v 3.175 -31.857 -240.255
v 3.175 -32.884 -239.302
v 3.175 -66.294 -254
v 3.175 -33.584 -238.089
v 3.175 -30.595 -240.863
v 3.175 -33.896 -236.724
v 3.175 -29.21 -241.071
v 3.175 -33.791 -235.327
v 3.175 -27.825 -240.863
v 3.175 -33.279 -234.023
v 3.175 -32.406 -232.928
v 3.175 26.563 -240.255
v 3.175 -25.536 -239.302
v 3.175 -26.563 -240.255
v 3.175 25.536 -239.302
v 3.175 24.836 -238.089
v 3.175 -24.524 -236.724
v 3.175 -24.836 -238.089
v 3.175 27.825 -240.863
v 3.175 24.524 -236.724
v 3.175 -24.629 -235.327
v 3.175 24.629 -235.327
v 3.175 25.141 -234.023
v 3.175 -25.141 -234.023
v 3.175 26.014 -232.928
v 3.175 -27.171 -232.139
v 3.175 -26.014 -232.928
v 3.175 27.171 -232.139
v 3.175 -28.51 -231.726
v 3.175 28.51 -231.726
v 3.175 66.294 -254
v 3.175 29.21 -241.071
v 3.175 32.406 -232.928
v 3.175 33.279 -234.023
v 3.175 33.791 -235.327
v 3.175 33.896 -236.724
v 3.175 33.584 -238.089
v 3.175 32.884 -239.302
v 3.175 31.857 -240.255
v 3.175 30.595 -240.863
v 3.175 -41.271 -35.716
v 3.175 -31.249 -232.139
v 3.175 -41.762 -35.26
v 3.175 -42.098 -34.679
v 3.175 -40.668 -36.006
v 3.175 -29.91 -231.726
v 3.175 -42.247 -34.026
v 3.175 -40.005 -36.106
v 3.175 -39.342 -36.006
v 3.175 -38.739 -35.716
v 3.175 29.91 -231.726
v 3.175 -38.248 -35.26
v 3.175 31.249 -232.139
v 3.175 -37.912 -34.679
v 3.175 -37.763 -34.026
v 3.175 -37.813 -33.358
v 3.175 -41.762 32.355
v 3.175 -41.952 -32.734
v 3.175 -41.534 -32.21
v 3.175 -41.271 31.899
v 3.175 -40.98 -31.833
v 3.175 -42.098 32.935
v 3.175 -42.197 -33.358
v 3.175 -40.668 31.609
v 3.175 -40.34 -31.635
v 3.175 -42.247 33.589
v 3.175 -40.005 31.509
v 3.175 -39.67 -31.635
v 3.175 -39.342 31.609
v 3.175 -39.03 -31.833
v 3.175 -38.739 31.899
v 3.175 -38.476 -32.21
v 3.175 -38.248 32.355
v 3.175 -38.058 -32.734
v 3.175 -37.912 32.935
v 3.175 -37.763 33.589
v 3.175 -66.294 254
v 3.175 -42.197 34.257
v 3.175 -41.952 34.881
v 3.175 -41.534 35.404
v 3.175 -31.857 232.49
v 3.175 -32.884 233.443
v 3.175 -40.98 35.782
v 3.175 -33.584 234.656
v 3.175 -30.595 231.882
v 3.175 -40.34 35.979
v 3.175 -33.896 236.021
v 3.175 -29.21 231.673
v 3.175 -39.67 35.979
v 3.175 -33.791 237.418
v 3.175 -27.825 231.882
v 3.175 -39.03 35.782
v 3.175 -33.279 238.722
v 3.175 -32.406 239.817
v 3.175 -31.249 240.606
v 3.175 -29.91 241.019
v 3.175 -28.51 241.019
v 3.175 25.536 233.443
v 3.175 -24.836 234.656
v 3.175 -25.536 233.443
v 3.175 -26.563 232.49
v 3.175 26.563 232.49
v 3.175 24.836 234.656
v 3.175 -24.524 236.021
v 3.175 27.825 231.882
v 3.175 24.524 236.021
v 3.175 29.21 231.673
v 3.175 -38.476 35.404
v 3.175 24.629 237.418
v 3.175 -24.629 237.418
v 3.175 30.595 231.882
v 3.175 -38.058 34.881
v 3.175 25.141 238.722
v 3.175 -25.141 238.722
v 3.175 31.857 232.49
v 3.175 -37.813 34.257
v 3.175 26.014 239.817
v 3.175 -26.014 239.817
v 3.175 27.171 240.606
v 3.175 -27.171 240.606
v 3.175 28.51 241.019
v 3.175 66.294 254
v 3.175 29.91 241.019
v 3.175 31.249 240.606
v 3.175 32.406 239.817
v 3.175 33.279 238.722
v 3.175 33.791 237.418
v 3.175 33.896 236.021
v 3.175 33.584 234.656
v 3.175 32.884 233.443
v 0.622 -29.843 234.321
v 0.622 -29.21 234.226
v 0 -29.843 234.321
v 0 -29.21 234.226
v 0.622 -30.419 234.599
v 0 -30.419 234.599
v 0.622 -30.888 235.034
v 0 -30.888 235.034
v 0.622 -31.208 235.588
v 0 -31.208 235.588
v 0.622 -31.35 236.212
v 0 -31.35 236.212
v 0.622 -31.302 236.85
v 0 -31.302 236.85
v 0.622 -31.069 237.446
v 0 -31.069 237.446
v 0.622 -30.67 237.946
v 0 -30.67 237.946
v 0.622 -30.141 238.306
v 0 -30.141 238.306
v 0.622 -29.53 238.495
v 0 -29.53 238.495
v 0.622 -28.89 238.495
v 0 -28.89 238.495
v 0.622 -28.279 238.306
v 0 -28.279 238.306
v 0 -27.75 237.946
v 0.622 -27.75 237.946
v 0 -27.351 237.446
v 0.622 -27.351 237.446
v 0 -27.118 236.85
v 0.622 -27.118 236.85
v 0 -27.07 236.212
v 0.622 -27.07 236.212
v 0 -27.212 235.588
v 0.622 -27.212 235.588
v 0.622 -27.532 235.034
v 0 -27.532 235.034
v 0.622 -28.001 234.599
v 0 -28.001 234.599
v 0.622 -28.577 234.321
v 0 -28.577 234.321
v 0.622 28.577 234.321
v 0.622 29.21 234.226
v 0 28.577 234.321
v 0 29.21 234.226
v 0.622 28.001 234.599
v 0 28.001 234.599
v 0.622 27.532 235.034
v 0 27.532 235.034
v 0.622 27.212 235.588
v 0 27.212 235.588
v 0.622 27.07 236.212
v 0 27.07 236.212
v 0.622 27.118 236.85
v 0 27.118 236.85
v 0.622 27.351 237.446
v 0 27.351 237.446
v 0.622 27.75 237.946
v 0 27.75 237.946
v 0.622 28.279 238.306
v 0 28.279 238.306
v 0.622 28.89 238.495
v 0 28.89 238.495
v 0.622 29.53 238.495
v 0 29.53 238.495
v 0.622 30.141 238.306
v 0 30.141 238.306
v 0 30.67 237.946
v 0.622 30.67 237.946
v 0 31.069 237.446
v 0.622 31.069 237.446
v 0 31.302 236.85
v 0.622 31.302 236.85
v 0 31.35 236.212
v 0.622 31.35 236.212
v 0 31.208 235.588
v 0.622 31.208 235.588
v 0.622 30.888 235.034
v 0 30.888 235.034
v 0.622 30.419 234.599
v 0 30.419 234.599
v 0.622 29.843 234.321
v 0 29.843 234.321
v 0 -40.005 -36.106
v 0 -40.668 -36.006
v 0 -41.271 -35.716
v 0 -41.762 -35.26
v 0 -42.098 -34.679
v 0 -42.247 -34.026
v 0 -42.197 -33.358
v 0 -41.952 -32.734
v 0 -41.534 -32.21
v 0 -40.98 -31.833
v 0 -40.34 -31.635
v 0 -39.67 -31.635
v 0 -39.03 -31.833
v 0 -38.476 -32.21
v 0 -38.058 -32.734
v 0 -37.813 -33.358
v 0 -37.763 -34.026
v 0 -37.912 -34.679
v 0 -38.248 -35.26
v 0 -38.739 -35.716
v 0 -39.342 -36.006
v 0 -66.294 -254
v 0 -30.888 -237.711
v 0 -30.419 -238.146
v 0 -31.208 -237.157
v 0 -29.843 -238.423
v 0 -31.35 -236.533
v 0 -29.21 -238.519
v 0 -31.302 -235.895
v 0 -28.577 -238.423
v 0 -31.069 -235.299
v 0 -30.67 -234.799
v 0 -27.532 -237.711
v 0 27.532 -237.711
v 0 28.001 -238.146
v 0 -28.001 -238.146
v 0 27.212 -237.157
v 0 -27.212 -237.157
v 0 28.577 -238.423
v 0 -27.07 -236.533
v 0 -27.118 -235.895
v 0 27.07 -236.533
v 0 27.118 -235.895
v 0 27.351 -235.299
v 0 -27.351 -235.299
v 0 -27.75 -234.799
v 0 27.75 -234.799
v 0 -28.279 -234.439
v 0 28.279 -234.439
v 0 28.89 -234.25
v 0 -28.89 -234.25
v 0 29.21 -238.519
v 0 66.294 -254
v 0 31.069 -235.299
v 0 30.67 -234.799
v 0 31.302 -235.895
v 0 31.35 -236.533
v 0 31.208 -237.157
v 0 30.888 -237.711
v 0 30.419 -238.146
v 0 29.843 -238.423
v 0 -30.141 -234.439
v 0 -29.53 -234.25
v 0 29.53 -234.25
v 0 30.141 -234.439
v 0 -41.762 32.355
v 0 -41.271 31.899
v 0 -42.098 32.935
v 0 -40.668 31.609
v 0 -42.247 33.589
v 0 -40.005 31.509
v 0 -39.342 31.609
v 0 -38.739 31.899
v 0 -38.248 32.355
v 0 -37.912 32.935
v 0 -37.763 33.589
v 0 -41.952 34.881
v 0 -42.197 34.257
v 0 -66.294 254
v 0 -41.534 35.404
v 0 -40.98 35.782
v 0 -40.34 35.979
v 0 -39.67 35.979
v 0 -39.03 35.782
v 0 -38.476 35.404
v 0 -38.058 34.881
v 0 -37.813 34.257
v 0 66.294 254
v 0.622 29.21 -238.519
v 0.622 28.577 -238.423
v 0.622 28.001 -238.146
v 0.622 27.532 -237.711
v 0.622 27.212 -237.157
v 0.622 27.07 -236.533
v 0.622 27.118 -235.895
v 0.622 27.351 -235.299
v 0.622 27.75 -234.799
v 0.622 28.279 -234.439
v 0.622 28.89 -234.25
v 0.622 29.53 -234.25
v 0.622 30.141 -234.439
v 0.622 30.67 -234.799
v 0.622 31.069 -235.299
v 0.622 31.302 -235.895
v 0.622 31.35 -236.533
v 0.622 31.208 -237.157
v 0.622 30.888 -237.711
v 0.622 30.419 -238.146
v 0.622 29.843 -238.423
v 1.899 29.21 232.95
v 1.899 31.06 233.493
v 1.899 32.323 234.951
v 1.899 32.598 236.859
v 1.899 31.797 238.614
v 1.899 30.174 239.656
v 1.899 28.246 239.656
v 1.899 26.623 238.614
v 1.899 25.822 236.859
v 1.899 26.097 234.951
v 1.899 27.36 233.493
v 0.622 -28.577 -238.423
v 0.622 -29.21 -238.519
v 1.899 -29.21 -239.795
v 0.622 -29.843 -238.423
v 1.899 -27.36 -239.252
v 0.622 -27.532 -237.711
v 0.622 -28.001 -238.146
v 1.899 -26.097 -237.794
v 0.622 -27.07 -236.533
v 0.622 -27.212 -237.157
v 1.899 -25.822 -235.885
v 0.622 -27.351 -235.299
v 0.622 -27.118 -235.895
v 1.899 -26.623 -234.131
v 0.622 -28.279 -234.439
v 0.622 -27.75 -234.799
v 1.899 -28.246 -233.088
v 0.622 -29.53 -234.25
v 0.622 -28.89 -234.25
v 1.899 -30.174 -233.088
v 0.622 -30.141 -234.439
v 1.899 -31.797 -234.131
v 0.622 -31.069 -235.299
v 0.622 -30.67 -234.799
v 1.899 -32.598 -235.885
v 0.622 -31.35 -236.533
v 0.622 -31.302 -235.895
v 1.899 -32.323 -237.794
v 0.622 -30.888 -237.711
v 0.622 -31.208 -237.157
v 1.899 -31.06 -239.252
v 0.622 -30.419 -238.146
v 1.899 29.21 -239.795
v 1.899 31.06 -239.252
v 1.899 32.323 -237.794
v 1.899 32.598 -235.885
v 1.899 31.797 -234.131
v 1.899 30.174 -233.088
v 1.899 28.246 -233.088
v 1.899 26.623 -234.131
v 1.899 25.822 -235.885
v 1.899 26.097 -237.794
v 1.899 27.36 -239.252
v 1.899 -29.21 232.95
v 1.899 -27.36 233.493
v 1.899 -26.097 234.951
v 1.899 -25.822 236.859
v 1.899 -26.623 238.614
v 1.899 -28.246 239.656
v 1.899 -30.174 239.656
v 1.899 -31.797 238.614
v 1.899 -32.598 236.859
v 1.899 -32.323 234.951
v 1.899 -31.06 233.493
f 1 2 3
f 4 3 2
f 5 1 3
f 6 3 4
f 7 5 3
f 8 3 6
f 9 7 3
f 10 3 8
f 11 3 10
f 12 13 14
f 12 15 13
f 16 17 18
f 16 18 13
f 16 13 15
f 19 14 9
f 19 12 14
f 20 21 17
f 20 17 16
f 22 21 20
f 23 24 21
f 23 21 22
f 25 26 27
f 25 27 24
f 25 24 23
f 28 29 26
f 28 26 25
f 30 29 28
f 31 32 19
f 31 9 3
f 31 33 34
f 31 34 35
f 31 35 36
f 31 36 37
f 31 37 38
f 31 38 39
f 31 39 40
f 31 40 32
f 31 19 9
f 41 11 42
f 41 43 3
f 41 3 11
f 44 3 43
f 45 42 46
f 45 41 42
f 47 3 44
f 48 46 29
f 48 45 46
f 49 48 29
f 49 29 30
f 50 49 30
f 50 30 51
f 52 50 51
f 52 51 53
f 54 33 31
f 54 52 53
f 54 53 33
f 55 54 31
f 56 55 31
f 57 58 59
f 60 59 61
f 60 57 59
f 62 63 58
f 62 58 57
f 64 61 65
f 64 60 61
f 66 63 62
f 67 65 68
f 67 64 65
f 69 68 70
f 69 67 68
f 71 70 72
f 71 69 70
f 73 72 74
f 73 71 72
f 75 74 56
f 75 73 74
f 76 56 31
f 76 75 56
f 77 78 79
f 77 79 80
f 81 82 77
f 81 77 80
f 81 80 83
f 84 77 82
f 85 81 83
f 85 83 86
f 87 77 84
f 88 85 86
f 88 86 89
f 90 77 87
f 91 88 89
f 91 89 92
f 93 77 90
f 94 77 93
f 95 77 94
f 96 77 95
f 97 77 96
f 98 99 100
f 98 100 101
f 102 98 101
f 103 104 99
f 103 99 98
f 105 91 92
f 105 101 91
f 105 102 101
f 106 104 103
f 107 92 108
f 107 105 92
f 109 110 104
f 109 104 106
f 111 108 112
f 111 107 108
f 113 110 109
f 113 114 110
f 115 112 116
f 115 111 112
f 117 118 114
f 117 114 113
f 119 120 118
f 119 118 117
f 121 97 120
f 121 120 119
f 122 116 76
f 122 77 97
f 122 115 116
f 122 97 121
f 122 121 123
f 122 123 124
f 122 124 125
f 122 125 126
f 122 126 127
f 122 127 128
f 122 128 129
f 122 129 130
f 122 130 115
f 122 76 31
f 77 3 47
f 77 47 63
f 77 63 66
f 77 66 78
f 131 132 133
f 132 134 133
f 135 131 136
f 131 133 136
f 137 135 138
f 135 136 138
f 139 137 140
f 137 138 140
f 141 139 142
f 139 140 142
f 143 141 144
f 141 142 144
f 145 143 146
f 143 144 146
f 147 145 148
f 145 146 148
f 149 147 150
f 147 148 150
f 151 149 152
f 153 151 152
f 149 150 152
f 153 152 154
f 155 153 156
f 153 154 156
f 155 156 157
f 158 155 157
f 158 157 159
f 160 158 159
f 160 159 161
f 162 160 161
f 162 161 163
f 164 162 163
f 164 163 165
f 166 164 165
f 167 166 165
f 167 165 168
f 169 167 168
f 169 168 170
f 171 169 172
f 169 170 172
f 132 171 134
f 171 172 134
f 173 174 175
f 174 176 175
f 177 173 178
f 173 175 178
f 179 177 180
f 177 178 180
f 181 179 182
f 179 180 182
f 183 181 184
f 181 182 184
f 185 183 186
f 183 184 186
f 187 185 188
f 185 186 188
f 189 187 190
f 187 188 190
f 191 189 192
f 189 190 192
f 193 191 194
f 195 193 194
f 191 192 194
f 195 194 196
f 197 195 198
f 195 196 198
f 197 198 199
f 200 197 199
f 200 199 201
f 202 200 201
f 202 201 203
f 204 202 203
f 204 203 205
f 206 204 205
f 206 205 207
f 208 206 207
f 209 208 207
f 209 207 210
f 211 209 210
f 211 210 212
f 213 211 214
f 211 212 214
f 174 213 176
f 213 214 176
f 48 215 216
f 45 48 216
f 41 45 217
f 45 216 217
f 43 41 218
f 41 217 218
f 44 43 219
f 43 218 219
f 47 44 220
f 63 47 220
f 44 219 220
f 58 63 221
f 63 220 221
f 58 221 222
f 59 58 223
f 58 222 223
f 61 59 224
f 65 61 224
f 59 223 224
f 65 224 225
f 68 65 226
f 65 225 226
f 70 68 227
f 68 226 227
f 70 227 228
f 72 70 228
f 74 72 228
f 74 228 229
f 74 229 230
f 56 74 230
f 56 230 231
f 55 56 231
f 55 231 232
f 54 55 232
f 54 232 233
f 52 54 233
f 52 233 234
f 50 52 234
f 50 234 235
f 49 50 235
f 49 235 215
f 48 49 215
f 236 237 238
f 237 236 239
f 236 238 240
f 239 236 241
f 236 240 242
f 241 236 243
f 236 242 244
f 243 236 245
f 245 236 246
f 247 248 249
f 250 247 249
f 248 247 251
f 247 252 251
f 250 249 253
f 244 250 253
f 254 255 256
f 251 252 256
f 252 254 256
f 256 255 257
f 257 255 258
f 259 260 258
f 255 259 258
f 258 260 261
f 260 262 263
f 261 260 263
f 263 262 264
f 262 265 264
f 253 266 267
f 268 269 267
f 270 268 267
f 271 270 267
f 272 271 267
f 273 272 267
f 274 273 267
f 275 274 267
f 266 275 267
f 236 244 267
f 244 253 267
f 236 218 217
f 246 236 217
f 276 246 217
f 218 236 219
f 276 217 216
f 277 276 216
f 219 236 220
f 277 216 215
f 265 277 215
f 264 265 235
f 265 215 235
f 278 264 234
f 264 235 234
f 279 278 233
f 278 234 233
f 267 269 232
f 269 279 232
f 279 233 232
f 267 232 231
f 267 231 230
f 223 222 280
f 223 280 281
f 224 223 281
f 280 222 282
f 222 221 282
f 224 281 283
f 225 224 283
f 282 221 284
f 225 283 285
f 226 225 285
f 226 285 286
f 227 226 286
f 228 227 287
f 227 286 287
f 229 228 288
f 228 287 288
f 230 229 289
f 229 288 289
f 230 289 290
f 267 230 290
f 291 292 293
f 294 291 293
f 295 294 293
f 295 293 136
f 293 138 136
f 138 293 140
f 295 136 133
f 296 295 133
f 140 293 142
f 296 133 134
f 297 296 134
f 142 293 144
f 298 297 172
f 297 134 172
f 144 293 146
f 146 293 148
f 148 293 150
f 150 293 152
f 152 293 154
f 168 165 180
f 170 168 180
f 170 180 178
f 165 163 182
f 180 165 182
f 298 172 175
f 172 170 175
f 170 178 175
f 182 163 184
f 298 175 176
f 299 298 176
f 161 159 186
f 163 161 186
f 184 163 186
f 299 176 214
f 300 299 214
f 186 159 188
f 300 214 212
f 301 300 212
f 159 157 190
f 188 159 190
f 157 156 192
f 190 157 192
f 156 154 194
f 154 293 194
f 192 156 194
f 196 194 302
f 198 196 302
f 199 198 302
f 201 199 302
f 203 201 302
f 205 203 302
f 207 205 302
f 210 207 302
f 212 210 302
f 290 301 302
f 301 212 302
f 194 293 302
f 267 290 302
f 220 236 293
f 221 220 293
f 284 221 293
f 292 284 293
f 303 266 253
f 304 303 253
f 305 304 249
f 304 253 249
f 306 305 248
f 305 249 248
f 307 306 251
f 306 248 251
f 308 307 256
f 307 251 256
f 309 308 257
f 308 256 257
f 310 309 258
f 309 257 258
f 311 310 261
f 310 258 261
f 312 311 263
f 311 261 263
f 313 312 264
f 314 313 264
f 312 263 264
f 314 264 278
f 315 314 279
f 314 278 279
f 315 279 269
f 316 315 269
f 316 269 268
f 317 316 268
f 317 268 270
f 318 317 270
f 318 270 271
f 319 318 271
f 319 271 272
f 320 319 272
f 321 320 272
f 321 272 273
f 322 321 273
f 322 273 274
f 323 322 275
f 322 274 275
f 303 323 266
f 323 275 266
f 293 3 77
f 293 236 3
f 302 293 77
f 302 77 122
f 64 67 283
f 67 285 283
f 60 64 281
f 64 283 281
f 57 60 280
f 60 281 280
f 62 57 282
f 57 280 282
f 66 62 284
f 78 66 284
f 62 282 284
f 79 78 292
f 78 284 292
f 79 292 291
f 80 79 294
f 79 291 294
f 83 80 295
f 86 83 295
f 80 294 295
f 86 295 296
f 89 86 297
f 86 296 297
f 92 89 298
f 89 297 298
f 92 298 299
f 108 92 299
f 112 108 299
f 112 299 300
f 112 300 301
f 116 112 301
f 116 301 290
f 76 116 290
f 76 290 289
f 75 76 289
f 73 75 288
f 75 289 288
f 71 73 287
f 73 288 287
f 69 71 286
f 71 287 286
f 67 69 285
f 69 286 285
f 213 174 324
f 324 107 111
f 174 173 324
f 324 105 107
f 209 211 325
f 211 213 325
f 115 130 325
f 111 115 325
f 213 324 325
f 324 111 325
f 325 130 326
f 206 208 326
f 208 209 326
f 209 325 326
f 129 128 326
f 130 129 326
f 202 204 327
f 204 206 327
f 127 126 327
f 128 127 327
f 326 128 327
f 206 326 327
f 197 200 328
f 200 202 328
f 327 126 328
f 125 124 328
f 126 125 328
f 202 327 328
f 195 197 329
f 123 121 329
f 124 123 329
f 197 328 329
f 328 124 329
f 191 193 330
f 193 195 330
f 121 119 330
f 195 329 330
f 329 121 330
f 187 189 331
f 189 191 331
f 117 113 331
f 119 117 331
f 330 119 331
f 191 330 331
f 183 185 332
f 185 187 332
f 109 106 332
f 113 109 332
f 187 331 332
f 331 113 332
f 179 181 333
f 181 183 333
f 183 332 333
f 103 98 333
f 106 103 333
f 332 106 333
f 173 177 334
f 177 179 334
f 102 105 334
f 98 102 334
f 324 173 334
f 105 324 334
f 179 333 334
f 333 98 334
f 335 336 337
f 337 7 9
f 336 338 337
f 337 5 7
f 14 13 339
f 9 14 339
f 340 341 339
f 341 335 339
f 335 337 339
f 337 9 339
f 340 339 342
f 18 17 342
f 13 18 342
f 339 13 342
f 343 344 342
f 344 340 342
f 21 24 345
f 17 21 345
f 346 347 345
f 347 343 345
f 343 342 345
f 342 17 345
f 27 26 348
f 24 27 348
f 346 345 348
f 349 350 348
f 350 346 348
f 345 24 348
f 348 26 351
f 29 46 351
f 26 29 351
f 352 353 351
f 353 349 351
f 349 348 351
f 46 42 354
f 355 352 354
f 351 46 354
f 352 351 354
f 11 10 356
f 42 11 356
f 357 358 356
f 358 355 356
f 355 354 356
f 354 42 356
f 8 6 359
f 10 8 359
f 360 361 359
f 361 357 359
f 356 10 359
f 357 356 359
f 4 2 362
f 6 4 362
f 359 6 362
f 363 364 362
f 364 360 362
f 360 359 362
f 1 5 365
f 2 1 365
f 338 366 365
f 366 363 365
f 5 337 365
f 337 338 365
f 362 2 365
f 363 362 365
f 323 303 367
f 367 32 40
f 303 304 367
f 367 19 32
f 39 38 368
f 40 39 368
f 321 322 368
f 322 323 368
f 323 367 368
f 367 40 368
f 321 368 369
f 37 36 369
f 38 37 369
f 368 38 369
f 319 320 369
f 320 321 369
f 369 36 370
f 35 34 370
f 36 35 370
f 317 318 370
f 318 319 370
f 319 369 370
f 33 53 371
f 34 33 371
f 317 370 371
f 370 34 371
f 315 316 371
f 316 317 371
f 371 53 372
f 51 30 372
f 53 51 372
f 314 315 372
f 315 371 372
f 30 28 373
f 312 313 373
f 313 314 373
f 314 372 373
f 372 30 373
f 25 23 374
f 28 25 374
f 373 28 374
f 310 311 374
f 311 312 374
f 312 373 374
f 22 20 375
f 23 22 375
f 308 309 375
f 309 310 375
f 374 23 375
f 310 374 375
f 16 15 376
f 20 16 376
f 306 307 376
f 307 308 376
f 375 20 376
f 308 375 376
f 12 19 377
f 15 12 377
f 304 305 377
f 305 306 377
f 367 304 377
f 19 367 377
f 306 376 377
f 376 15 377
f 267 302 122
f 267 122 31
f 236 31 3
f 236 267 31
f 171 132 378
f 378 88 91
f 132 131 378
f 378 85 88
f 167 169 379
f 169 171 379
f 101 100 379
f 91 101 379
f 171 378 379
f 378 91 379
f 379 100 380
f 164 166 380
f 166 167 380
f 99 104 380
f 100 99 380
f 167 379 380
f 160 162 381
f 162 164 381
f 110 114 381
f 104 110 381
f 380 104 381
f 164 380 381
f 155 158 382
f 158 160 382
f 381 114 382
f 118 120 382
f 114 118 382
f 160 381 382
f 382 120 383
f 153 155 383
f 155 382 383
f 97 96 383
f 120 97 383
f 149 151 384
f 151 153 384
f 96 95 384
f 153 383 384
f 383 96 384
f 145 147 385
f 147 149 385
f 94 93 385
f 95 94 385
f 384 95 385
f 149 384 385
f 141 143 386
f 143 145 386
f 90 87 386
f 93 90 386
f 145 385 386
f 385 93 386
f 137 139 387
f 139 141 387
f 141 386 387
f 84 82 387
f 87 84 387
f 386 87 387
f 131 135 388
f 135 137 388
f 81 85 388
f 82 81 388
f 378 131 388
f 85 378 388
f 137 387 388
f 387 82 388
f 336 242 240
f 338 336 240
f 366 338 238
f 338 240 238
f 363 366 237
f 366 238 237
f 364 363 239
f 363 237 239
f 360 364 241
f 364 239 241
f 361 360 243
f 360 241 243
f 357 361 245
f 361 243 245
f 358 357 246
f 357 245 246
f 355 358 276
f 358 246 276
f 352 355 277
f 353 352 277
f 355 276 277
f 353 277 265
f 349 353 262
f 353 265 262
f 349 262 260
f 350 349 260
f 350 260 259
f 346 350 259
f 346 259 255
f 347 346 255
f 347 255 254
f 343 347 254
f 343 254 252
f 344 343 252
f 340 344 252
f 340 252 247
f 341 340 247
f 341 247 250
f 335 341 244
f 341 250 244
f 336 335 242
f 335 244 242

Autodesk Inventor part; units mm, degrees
ref_plane "YZ Plane" through (0, 0, 0) normal (1, 0, 0) x (0, 1, 0)
ref_plane "XZ Plane" through (0, 0, 0) normal (0, 1, 0) x (-1, 0, 0)
ref_plane "XY Plane" through (0, 0, 0) normal (0, 0, 1) x (1, 0, 0)
sketch "Sketch1" plane through (0, 0, 0) normal (1, 0, 0) x (0, 1, 0)
  line L0 (-66.294, 254) -> (66.294, 254)
  line L1 (66.294, 254) -> (66.294, -254)
  line L2 (66.294, -254) -> (-66.294, -254)
  line L3 (-66.294, -254) -> (-66.294, 254)
  line L4 (-66.294, 254) -> (66.294, -254) construction
  line L5 (66.294, 254) -> (-66.294, -254) construction
  point P0 (0, 0)
  dimension "d0" = 508
  dimension "d1" = 132.588
extrude "Extrusion1" add sketch "Sketch1" along normal blind 3.175
sketch "Sketch2" plane through (3.175, 0, 0) normal (1, 0, 0) x (0, 0, -1)
  line L0 (-67.5894, -66.294) -> (67.691, -66.294) construction
  line L1 (67.691, -66.294) -> (67.691, -22.098) construction
  line L2 (67.691, -22.098) -> (-67.5894, -22.098) construction
  line L3 (-67.5894, -22.098) -> (-67.5894, -66.294) construction
  line L4 (-67.5894, -66.294) -> (67.691, -22.098) construction
  line L5 (67.691, -66.294) -> (-67.5894, -22.098) construction
  line L6 (254, -66.294) -> (254, 66.294) construction
  line L7 (-254, -66.294) -> (254, -66.294) construction
  point P0 (0, 0)
  point P1 (0.0508, -44.196)
  point P2 (10.6003, -66.294)
  dimension "d4" = 135.2804
  dimension "d5" = 44.196
  dimension "d6" = 186.309
sketch "Sketch3" plane through (3.175, 0, 0) normal (1, 0, 0) x (0, 0, -1)
  line L0 (-33.7566, -40.005) -> (33.8582, -40.005) construction
  line L1 (-254, -66.294) -> (254, -66.294) construction
  line L2 (67.691, -66.294) -> (67.691, -22.098) construction
  line L3 (-67.5894, -22.098) -> (-67.5894, -66.294) construction
  point P0 (0, 0)
  dimension "d7" = 26.289
  dimension "d17" = 33.8328
  dimension "d18" = 33.8328
hole "Hole1" at (3.175, -40.005, 33.7566) at (3.175, -40.005, -33.8582) direction (-1, 0, 0) diameter 4.4958 end through all clearance for "Countersunk Flat Head Screw ISO 2009/7046" size "M4" standard "ISO"
sketch "brackets" plane through (3.175, 0, 0) normal (1, 0, 0) x (0, 0, -1)
  line L0 (254, -66.294) -> (254, 66.294) construction
  line L1 (249.428, 54.61) -> (230.378, 54.61) construction
  line L2 (230.378, 54.61) -> (230.378, -54.61) construction
  line L3 (230.378, -54.61) -> (249.428, -54.61) construction
  line L4 (249.428, -54.61) -> (249.428, 54.61) construction
  line L5 (254, 66.294) -> (-254, 66.294) construction
  line L6 (-254, 66.294) -> (-254, -66.294) construction
  line L7 (-249.428, 54.61) -> (-230.378, 54.61) construction
  line L8 (-230.378, 54.61) -> (-230.378, -54.61) construction
  line L9 (-230.378, -54.61) -> (-249.428, -54.61) construction
  line L10 (-249.428, -54.61) -> (-249.428, 54.61) construction
  point P0 (0, 0)
  point P1 (-236.3724, 29.21)
  point P2 (-236.3724, -29.21)
  point P3 (236.3724, 29.21)
  point P4 (236.3724, -29.21)
  dimension "d20" = 19.05
  dimension "d21" = 109.22
  dimension "d22" = 11.684
  dimension "d23" = 19.05
  dimension "d24" = 109.22
  dimension "d25" = 11.684
  dimension "d26" = 25.4
  dimension "d27" = 5.9944
  dimension "d28" = 25.4
  dimension "d29" = 5.9944
  dimension "d30" = 25.4
  dimension "d31" = 5.9944
  dimension "d32" = 25.4
  dimension "d33" = 5.9944
  dimension "d41" = 4.572
  dimension "d42" = 4.572
hole "Hole2" at (3.175, 29.21, 236.3724) at (3.175, -29.21, 236.3724) at (3.175, 29.21, -236.3724) at (3.175, -29.21, -236.3724) direction (-1, 0, 0) diameter 4.2926 end through all countersink diameter 9.398 countersink angle 90 clearance for "Countersunk Flat Head Screw ISO 2009/7046" size "M4" standard "ISO"
properties part number "nmt_sidepanel_20in"
